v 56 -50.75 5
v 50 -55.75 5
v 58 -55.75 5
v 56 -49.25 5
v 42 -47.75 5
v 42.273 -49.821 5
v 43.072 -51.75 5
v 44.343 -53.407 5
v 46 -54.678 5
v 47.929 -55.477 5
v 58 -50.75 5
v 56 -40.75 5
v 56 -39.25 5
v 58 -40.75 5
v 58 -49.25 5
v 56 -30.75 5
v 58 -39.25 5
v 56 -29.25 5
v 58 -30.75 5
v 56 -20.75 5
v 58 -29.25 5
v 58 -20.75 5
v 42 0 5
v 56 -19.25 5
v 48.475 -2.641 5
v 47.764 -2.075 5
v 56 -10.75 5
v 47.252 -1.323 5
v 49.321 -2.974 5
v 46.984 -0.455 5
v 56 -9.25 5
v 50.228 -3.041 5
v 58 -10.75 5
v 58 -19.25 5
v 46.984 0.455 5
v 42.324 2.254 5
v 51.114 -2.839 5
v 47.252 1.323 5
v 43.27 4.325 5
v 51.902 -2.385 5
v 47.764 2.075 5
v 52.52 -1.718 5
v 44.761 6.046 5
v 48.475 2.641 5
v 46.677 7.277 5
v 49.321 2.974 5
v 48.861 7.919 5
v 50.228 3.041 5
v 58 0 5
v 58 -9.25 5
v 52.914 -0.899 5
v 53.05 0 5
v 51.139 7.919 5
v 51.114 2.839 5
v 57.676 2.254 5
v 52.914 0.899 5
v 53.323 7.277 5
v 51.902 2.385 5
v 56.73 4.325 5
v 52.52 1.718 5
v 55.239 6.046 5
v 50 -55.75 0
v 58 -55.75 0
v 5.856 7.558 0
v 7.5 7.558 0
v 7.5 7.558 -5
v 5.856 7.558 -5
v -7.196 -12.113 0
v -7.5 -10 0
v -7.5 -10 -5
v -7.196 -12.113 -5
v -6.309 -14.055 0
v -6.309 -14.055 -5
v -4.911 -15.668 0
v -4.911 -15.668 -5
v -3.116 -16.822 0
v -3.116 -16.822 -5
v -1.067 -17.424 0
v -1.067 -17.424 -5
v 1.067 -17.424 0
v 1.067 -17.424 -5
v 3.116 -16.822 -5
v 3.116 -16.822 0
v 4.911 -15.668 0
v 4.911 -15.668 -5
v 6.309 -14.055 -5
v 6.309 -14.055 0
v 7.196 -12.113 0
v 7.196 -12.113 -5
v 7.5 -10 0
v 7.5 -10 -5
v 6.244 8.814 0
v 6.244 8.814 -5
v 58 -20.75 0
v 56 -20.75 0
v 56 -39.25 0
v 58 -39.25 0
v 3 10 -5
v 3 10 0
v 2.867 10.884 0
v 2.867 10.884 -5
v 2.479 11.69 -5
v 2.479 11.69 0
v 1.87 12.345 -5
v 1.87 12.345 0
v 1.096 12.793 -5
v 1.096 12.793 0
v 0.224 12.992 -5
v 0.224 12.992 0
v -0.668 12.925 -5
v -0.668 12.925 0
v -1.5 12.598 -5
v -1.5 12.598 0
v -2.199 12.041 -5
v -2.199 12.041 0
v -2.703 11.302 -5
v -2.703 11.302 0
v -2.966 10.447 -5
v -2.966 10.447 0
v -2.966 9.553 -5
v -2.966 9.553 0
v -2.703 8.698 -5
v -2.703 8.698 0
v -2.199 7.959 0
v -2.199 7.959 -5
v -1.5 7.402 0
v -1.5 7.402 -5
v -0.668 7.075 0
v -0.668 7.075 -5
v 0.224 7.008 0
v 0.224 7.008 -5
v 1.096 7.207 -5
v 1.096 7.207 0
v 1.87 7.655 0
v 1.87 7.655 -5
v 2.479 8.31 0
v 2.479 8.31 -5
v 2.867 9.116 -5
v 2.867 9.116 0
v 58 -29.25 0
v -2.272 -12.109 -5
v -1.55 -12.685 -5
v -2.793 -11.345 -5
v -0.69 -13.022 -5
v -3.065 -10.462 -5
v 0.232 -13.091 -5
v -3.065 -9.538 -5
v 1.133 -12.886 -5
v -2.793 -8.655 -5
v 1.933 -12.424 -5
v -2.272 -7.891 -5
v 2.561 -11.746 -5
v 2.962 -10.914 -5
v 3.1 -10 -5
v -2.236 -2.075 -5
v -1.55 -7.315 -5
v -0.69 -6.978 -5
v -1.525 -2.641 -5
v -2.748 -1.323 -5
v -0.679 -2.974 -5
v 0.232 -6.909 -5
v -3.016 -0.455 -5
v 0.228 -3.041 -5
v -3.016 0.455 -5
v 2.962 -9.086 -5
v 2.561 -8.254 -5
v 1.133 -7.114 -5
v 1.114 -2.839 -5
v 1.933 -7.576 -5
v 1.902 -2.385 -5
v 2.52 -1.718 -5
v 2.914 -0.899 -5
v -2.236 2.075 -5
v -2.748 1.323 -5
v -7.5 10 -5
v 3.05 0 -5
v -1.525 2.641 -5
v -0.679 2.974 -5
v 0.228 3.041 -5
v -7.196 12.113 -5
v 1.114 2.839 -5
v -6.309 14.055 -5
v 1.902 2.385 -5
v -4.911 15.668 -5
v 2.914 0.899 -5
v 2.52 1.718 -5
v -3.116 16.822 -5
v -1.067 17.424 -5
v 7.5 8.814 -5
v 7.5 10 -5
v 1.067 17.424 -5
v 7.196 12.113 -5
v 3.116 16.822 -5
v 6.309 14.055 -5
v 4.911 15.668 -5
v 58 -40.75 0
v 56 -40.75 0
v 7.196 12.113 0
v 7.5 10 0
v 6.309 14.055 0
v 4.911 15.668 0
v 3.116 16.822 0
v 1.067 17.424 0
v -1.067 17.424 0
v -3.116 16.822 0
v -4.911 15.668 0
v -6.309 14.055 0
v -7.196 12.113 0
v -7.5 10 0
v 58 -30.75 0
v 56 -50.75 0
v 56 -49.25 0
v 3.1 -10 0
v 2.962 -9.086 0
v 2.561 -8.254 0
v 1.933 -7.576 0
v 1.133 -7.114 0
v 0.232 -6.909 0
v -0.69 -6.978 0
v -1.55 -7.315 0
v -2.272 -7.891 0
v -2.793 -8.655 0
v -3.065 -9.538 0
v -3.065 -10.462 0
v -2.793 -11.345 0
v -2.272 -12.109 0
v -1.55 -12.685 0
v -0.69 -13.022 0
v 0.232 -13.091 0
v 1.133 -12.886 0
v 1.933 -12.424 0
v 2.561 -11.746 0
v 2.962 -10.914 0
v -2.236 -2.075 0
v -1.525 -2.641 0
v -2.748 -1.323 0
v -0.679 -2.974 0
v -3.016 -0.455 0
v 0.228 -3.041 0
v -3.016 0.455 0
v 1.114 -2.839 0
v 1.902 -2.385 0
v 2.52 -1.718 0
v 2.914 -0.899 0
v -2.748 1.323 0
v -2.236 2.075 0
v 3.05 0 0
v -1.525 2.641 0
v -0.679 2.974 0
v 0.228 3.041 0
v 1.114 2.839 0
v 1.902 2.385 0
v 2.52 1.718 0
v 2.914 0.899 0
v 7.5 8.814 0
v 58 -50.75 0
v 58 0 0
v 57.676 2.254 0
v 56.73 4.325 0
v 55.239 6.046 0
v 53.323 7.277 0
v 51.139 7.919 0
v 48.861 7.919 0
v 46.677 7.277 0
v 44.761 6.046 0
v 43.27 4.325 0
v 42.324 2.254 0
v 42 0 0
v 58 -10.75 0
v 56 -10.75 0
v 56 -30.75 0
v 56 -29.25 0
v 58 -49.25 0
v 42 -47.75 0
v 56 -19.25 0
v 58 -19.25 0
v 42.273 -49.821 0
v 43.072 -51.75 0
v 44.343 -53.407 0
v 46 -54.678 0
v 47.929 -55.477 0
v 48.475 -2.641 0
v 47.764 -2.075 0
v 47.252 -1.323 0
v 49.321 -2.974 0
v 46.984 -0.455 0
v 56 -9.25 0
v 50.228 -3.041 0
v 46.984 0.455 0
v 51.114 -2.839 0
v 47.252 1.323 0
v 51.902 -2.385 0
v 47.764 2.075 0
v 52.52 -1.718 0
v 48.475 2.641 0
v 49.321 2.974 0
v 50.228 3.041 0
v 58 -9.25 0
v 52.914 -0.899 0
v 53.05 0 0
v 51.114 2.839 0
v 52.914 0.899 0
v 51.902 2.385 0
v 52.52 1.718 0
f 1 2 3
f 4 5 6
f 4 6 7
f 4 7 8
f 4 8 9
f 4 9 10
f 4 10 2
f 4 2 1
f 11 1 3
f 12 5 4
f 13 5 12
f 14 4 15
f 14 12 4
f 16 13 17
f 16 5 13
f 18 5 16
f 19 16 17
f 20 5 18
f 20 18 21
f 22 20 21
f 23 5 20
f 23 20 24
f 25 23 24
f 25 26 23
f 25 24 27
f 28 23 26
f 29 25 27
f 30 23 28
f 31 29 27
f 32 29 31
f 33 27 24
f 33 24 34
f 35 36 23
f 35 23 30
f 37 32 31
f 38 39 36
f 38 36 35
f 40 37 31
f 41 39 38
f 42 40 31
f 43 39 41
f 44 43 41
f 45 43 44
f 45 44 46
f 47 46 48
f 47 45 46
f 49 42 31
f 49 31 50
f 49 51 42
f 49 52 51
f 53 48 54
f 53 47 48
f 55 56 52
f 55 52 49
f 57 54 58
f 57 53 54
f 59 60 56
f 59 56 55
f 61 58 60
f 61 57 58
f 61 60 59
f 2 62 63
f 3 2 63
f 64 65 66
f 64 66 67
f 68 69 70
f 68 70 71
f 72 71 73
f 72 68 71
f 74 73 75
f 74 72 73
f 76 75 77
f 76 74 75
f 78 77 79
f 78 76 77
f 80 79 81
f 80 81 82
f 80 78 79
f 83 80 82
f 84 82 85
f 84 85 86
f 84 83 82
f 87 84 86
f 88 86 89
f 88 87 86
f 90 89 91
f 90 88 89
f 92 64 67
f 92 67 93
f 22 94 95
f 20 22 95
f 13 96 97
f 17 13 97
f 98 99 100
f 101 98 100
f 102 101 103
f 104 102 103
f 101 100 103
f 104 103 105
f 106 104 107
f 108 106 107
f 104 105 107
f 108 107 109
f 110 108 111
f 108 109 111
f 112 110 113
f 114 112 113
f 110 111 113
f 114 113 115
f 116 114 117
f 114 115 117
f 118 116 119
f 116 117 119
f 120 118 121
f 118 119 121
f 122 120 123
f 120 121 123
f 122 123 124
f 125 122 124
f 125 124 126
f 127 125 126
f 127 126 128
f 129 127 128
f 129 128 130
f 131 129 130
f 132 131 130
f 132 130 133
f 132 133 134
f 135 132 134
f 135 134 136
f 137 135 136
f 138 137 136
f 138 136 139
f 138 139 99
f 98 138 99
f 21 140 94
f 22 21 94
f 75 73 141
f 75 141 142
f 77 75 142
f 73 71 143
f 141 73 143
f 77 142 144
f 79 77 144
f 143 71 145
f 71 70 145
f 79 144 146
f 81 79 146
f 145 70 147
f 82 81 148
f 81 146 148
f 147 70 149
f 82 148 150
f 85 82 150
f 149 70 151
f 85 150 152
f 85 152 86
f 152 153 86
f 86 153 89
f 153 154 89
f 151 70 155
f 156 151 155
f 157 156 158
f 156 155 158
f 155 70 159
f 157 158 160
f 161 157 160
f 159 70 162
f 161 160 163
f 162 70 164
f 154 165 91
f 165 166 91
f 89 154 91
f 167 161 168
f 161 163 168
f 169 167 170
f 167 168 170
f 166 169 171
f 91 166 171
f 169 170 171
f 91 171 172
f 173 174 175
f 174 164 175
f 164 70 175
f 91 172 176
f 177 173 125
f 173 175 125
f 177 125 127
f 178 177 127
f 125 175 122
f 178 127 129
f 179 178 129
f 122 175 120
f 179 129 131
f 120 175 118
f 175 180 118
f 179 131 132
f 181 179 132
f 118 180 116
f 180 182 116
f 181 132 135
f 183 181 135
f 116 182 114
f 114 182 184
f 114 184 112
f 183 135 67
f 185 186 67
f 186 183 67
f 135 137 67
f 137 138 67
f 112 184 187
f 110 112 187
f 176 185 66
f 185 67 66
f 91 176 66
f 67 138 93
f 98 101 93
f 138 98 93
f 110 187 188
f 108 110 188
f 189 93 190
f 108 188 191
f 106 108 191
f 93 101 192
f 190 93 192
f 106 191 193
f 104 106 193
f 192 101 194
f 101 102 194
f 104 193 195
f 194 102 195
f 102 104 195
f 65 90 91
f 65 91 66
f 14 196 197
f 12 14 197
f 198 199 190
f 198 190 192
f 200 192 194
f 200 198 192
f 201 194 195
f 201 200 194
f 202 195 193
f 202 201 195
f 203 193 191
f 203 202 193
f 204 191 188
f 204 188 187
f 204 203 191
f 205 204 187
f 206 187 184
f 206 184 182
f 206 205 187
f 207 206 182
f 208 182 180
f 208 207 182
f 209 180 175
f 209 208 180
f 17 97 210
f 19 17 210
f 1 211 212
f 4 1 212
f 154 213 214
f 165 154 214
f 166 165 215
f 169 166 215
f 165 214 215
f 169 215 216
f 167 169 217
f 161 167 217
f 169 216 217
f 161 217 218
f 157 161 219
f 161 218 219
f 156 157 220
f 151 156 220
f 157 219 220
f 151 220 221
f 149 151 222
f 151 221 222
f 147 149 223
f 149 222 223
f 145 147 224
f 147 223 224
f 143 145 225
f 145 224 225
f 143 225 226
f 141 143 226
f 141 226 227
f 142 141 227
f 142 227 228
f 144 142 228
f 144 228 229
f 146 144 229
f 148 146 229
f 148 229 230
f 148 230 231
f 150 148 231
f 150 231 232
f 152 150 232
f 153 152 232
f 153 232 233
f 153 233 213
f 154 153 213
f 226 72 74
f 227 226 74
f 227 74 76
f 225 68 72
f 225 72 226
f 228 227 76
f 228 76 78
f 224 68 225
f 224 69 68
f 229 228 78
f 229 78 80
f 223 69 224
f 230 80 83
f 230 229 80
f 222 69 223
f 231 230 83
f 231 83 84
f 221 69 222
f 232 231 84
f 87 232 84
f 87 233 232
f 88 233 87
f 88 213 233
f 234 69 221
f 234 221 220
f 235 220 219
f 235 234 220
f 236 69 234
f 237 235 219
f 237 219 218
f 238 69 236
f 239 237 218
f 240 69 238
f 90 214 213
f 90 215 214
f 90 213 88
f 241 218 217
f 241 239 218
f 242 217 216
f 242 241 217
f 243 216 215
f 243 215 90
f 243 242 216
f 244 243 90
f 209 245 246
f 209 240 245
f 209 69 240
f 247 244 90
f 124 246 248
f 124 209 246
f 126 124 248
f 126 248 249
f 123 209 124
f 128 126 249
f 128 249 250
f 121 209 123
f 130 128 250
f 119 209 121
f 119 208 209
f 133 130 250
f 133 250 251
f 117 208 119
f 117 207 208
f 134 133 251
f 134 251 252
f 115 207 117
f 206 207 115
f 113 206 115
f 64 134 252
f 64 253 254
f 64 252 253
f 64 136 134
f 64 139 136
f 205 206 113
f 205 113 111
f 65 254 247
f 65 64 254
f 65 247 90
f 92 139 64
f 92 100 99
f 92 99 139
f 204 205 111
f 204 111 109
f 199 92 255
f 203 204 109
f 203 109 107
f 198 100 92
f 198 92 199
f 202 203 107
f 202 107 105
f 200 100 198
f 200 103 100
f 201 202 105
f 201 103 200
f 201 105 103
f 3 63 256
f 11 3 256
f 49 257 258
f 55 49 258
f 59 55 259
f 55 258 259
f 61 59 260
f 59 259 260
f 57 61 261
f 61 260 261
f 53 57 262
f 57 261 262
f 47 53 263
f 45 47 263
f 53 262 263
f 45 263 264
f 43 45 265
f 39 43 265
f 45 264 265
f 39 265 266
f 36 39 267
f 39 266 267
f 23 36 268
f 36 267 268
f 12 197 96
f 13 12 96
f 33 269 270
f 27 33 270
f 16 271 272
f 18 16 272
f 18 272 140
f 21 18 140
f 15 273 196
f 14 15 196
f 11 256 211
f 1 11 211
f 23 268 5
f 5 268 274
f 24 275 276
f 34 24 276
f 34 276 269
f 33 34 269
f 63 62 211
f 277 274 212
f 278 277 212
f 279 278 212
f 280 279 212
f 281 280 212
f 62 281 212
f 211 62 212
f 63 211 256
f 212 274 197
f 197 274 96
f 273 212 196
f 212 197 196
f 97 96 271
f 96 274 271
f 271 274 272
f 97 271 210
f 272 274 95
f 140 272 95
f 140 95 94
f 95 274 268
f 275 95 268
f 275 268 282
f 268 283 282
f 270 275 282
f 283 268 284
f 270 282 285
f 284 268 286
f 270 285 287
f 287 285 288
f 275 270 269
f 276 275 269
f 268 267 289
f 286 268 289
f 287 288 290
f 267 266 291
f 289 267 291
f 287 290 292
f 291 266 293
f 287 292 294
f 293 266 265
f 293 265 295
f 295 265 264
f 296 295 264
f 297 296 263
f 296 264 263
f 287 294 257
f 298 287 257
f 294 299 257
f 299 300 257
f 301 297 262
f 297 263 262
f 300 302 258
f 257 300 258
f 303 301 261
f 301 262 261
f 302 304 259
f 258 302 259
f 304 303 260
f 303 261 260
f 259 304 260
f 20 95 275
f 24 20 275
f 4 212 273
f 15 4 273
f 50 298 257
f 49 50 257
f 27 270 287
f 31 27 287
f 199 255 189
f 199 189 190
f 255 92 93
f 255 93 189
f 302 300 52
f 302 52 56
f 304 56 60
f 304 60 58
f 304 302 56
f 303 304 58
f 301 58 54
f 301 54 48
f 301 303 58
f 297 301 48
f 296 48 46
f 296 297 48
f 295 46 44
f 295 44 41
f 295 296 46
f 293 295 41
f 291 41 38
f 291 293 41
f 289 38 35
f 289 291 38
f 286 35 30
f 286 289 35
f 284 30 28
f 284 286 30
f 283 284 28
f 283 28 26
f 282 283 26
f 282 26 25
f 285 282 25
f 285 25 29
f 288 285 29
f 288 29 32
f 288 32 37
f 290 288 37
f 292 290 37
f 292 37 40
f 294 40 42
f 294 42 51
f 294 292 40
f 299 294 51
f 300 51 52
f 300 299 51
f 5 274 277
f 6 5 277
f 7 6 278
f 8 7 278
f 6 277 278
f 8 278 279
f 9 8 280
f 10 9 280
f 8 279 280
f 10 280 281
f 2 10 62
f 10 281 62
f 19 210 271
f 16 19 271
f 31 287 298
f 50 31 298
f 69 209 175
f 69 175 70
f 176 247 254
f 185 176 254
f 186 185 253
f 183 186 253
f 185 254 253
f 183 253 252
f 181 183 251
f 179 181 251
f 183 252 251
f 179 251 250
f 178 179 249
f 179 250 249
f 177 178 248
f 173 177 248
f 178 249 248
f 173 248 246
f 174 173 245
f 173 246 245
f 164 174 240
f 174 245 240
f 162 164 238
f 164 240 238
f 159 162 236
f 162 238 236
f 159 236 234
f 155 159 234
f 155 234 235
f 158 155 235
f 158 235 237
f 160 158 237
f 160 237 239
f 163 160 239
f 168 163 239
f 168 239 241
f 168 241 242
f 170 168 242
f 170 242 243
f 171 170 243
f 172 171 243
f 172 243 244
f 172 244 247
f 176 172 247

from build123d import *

# Parameters (mm, degrees)
F1_DEPTH = 5
F2_R     = 3.05
F2_R_2   = 3
F2_R_3   = 3.1
F3_DEPTH = 25
F4_R     = 3.05
F5_DEPTH = 5


with BuildPart() as f1:
    # F0 (on Top) → F1 (new body)
    with BuildSketch(Plane.XY):
        with BuildLine():
            Line((7.5, 8.814171), (7.5, 10))
            ThreePointArc((7.5, 10), (0, 17.5), (-7.5, 10))
            Line((-7.5, 10), (-7.5, -10))
            ThreePointArc((-7.5, -10), (0, -17.5), (7.5, -10))
            Line((7.5, -10), (7.5, 7.558068))
            Line((7.5, 7.558068), (5.85612, 7.558068))
            Line((5.85612, 7.558068), (6.243898, 8.814171))
            Line((6.243898, 8.814171), (7.5, 8.814171))
        make_face()
    extrude(amount=-F1_DEPTH)

    # F2 (on face) → F3 (cut)
    with BuildSketch(Plane.XY):
        Circle(F2_R)
        with Locations((0, 10)):
            Circle(F2_R_2)
        with Locations((0, -10)):
            Circle(F2_R_3)
    extrude(amount=-F3_DEPTH, mode=Mode.SUBTRACT)


with BuildPart() as f5:
    # F4 (on Top) → F5 (new body)
    with BuildSketch(Plane.XY):
        with BuildLine():
            Line((58, -9.25), (58, 0))
            ThreePointArc((58, 0), (50, 8), (42, 0))
            Line((42, 0), (42, -47.75))
            ThreePointArc((42, -47.75), (44.343146, -53.406854), (50, -55.75))
            Line((50, -55.75), (58, -55.75))
            Line((58, -55.75), (58, -50.75))
            Line((58, -50.75), (56, -50.75))
            Line((56, -50.75), (56, -49.25))
            Line((56, -49.25), (58, -49.25))
            Line((58, -49.25), (58, -40.75))
            Line((58, -40.75), (56, -40.75))
            Line((56, -40.75), (56, -39.25))
            Line((56, -39.25), (58, -39.25))
            Line((58, -39.25), (58, -30.75))
            Line((58, -30.75), (56, -30.75))
            Line((56, -30.75), (56, -29.25))
            Line((56, -29.25), (58, -29.25))
            Line((58, -29.25), (58, -20.75))
            Line((58, -20.75), (56, -20.75))
            Line((56, -20.75), (56, -19.25))
            Line((56, -19.25), (58, -19.25))
            Line((58, -19.25), (58, -10.75))
            Line((58, -10.75), (56, -10.75))
            Line((56, -10.75), (56, -9.25))
            Line((56, -9.25), (58, -9.25))
        make_face()
        with Locations((50, 0)):
            Circle(F4_R, mode=Mode.SUBTRACT)
    extrude(amount=F5_DEPTH)


solid = Compound([f1.part, f5.part])
